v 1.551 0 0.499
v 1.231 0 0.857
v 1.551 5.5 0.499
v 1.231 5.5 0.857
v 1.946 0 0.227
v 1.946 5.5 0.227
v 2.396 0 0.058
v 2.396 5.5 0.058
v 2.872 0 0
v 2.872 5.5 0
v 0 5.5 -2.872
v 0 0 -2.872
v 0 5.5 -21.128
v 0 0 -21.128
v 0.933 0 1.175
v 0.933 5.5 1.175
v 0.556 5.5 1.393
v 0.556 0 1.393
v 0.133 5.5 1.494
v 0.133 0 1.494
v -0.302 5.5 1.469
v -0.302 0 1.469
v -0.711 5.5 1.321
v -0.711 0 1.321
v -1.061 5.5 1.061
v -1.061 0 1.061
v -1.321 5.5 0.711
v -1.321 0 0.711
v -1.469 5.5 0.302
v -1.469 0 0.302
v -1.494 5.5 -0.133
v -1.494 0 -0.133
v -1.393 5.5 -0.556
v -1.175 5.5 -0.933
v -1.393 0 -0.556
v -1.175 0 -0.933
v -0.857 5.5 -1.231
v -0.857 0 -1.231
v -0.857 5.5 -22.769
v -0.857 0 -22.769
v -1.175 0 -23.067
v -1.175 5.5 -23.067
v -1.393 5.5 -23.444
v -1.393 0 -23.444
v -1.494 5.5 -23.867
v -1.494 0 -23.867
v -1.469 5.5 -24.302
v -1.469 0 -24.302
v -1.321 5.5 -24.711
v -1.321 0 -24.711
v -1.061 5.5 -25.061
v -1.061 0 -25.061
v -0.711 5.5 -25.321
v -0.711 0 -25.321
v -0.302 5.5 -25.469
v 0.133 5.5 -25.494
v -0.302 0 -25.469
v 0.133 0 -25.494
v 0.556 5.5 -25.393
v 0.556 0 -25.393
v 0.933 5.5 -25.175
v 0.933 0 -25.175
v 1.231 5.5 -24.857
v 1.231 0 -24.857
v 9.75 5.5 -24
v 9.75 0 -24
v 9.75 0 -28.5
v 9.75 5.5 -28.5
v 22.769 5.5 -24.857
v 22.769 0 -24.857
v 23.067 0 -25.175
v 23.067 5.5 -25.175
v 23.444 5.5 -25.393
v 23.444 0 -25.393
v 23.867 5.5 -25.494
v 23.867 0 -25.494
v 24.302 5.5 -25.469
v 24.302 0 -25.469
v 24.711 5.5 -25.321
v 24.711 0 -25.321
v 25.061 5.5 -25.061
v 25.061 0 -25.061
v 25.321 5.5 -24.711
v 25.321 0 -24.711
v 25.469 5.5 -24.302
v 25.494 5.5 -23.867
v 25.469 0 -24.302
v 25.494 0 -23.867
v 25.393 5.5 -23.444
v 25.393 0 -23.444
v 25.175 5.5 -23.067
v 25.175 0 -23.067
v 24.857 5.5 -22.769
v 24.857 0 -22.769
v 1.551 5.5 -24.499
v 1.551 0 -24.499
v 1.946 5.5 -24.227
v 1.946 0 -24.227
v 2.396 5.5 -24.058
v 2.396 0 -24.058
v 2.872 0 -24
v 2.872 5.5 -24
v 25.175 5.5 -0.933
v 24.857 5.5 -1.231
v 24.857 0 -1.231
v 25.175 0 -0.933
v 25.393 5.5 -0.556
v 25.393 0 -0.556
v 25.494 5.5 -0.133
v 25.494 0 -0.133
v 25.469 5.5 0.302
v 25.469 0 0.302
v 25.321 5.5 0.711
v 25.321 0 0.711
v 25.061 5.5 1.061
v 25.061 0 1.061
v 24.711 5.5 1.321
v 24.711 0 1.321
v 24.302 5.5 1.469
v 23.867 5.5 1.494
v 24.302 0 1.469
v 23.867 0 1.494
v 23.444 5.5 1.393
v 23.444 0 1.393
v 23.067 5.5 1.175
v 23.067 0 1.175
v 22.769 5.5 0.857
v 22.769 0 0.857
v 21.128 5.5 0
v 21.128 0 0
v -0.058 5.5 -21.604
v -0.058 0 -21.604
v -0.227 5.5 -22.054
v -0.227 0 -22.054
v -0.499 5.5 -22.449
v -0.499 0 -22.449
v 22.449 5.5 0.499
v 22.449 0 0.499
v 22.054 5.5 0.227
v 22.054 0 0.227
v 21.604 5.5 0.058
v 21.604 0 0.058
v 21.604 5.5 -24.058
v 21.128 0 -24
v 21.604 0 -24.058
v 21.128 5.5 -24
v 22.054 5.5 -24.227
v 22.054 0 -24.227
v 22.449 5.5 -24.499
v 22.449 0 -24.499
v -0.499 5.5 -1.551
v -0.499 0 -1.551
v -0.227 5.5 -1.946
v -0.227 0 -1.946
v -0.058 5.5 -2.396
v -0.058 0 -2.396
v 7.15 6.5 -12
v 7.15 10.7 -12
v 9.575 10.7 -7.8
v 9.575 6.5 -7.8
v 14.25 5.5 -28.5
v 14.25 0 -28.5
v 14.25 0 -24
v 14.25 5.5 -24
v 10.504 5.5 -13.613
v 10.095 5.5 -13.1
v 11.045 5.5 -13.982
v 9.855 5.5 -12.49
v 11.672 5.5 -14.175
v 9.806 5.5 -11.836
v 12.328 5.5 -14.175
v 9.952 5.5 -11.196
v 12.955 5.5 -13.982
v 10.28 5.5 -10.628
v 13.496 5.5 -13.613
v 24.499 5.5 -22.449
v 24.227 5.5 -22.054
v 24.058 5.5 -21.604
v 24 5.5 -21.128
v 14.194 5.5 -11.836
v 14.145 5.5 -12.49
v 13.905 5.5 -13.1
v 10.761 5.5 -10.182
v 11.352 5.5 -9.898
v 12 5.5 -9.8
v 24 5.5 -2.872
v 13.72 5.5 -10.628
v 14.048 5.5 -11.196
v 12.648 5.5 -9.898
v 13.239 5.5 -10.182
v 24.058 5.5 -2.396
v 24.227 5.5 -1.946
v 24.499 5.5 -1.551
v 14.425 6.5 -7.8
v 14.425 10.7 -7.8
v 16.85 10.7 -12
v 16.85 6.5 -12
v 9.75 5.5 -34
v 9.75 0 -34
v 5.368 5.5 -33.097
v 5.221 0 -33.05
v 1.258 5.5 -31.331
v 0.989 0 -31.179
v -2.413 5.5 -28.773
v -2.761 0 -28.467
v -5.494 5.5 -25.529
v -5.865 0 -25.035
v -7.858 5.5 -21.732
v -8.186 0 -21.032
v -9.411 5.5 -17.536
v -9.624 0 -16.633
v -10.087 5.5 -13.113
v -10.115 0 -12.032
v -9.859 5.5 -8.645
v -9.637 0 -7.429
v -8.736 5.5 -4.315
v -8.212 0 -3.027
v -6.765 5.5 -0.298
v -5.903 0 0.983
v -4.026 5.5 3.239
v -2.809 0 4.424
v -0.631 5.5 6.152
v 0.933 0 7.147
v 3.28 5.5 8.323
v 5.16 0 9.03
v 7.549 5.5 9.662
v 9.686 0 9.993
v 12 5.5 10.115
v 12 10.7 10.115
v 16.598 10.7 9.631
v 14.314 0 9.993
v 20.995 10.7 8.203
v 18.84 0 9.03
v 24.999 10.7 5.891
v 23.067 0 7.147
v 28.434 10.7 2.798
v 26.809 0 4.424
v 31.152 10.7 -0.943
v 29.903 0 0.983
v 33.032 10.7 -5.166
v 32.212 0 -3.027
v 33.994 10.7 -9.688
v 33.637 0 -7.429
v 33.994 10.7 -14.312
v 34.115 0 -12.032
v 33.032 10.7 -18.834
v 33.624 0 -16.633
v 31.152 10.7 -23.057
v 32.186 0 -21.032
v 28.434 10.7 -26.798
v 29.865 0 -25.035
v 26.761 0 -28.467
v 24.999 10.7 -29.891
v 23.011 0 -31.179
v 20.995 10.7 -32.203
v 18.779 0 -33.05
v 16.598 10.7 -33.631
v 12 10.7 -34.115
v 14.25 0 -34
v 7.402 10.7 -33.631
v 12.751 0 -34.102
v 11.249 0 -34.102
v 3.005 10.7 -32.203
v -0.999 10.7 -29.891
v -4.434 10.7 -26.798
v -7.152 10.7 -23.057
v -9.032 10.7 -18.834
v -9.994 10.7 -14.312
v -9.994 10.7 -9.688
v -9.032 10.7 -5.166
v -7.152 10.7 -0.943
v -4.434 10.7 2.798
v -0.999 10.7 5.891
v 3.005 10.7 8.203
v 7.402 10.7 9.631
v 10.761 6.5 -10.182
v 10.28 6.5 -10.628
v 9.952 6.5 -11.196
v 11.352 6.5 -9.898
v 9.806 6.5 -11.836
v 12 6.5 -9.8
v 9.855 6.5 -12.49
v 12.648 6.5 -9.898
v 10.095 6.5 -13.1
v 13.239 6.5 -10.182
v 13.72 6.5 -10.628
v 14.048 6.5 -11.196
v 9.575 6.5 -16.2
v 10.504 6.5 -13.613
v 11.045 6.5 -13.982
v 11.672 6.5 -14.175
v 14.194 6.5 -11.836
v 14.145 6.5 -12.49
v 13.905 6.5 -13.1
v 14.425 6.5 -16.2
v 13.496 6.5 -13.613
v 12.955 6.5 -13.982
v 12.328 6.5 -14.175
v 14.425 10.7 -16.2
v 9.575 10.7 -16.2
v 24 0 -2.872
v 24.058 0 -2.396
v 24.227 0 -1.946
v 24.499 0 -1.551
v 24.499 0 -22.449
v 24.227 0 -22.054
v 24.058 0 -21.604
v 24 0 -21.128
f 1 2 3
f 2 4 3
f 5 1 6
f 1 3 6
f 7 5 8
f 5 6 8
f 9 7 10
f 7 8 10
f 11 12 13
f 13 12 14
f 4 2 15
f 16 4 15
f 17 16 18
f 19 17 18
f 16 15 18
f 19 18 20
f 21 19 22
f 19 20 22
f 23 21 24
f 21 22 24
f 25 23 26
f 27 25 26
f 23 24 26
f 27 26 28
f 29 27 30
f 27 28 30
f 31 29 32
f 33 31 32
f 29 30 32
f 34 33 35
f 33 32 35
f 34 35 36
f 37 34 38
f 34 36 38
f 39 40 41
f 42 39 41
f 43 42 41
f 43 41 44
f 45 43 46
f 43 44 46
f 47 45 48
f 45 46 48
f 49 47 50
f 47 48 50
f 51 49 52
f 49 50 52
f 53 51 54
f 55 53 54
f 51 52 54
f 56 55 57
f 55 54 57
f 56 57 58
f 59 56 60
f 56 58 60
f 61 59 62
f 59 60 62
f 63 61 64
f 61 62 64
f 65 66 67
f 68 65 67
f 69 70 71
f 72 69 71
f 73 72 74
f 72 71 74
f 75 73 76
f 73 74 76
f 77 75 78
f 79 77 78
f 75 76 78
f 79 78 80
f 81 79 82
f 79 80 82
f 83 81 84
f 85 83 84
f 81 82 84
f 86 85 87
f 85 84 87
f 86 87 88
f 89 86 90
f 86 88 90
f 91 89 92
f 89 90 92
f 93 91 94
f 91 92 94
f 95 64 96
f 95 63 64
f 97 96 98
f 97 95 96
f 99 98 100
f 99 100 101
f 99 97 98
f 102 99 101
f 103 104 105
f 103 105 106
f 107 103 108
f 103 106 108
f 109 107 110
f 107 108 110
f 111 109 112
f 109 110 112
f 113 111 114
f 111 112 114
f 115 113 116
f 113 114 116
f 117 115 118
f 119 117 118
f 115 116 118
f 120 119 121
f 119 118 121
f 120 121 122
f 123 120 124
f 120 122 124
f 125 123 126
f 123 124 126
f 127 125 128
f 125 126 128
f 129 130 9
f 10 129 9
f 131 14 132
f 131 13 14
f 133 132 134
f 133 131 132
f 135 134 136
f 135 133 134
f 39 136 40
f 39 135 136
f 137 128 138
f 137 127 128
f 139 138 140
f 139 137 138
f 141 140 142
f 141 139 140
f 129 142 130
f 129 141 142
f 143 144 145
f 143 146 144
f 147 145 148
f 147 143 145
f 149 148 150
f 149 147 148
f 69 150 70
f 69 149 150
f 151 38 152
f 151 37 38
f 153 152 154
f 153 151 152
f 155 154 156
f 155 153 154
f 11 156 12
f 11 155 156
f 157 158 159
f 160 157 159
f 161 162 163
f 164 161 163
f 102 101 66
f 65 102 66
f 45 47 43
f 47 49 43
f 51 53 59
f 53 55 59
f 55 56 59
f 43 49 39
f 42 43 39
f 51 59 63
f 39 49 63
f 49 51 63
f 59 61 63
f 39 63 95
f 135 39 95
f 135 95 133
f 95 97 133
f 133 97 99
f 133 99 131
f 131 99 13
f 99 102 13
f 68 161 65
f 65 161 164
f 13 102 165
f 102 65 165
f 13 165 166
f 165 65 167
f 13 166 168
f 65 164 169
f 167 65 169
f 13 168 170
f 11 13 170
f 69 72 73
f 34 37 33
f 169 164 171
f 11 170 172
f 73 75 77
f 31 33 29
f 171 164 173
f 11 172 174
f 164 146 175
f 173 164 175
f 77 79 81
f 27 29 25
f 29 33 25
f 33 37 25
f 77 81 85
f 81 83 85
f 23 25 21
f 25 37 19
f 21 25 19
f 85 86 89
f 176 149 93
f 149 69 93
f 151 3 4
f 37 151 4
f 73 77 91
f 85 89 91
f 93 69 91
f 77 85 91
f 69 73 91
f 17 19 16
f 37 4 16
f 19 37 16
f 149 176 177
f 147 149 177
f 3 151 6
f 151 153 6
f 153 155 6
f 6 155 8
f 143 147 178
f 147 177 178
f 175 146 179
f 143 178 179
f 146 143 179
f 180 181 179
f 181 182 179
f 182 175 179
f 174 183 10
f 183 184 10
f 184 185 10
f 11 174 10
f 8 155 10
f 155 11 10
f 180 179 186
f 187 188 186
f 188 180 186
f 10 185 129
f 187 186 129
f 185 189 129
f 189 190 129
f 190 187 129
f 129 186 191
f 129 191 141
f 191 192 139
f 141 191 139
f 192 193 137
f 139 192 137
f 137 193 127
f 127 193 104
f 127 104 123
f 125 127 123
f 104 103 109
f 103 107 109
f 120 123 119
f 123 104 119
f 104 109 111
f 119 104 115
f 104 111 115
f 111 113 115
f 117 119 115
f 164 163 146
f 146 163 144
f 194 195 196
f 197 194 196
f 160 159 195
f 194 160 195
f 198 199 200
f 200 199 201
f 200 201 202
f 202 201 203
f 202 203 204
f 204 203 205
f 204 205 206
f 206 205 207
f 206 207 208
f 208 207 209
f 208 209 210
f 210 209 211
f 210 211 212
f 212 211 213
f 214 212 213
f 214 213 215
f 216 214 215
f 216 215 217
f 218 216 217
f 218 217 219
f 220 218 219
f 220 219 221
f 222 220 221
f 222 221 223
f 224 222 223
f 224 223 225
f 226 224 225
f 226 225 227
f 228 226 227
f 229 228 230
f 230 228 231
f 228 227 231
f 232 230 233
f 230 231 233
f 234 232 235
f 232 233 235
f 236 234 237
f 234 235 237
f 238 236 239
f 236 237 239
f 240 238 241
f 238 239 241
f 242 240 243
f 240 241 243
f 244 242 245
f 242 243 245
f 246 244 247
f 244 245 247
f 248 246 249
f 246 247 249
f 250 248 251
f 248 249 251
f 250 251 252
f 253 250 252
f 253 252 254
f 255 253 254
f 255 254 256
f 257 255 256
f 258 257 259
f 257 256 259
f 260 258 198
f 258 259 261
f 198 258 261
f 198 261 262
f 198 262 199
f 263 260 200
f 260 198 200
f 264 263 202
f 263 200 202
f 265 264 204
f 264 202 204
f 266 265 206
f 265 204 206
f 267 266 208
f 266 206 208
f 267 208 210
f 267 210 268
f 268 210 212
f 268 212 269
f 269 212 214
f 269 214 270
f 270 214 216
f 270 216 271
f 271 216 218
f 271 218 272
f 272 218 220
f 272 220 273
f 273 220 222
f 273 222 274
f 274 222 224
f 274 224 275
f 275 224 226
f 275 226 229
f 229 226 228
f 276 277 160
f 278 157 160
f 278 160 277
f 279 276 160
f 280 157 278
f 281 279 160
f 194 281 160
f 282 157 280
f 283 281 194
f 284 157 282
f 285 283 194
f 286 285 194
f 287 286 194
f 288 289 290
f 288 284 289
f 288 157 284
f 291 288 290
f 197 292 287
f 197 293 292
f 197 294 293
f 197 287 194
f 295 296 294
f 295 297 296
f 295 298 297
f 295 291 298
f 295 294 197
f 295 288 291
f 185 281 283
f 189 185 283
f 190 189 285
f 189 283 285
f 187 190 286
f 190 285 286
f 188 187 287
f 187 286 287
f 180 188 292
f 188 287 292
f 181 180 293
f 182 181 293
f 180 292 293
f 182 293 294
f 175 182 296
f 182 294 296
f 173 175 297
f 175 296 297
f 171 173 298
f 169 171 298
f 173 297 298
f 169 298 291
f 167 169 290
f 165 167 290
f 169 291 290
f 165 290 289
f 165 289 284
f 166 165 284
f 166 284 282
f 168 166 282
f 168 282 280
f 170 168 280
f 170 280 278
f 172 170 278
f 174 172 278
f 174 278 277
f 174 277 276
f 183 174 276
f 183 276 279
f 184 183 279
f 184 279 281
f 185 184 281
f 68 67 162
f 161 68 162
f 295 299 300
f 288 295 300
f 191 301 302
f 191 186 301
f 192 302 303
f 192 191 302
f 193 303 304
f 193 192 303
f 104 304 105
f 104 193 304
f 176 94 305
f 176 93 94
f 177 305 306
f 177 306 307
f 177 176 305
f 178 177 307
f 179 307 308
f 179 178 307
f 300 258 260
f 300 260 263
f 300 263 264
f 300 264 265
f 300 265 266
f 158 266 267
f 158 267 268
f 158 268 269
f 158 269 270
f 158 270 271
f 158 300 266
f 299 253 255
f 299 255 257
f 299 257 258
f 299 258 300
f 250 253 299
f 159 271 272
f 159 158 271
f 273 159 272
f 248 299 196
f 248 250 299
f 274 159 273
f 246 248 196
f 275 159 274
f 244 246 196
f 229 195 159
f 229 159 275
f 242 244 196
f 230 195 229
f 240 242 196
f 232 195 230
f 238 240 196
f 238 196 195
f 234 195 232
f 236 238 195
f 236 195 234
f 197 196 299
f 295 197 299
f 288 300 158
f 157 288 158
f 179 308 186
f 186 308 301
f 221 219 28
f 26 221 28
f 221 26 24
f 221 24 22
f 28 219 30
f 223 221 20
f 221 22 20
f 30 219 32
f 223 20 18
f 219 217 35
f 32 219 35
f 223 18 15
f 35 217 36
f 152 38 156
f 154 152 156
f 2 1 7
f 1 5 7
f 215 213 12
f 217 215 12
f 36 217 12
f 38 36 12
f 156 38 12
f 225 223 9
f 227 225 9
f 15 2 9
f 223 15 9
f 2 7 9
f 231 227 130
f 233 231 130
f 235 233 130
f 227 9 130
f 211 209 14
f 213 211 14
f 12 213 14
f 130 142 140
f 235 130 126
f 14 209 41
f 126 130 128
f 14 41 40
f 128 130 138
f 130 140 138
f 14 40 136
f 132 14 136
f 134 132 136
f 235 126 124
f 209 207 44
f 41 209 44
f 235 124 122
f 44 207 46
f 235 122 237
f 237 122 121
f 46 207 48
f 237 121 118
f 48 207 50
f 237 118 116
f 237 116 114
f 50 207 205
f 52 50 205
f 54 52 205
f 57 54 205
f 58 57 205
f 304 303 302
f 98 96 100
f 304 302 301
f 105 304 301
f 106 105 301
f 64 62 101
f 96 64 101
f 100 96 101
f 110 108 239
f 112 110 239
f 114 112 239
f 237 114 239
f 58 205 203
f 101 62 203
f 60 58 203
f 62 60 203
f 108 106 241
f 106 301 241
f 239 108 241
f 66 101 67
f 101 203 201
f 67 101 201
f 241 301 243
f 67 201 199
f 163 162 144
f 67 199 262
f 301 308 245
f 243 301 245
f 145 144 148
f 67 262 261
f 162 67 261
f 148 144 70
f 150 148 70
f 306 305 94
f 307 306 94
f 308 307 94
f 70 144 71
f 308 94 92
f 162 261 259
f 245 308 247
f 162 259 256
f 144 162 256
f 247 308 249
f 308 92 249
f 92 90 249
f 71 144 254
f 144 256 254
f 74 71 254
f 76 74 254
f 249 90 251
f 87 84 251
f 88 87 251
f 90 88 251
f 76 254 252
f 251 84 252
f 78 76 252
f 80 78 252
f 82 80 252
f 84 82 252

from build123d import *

# Parameters (mm, degrees)
BOSS_EXTRUDE1_DEPTH = 5.5
FILLET1_R           = 2
SKETCH2_R           = 22.114757516
BOSS_EXTRUDE2_DEPTH = 5.2
CUT_EXTRUDE1_DEPTH  = 4.2
SKETCH4_R           = 2.2
CUT_EXTRUDE2_DEPTH  = 4.2


with BuildPart() as part:
    # Sketch1 → Boss-Extrude1 (new body)
    with BuildSketch(Plane(origin=(0, 0, 0), x_dir=(1, 0, 0), z_dir=(0, 1, 0))):
        with BuildLine():
            ThreePointArc((1.5, 0), (-1.060660172, -1.060660172), (0, 1.5))
            Line((0, 1.5), (0, 22.5))
            ThreePointArc((0, 22.5), (-1.060660172, 25.060660172), (1.5, 24))
            Line((1.5, 24), (9.75, 24))
            Line((9.75, 24), (9.75, 28.5))
            Line((9.75, 28.5), (9.75, 34))
            ThreePointArc((9.75, 34), (12, -10.114757516), (14.25, 34))
            Line((14.25, 34), (14.25, 28.5))
            Line((14.25, 28.5), (14.25, 24))
            Line((14.25, 24), (22.5, 24))
            ThreePointArc((22.5, 24), (25.060660172, 25.060660172), (24, 22.5))
            Line((24, 22.5), (24, 1.5))
            ThreePointArc((24, 1.5), (25.060660172, -1.060660172), (22.5, 0))
            Line((22.5, 0), (1.5, 0))
        make_face()
        with BuildLine():
            Line((9.75, 34), (9.75, 28.5))
            Line((9.75, 28.5), (14.25, 28.5))
            Line((14.25, 28.5), (14.25, 34))
            ThreePointArc((14.25, 34), (12, 34.114757516), (9.75, 34))
        make_face()
    extrude(amount=BOSS_EXTRUDE1_DEPTH)

    # Fillet1
    fillet1_edges = [part.edges().sort_by_distance(p)[0] for p in [
        (0, 2.75, -22.5),
        (0, 2.75, -1.5),
        (1.5, 2.75, 0),
        (22.5, 2.75, 0),
        (24, 2.75, -1.5),
        (24, 2.75, -22.5),
        (22.5, 2.75, -24),
        (1.5, 2.75, -24),
    ]]
    fillet(fillet1_edges, radius=FILLET1_R)

    # Sketch2 → Boss-Extrude2 (add)
    with BuildSketch(Plane(origin=(0, 5.5, 0), x_dir=(1, 0, 0), z_dir=(0, 1, 0))):
        with Locations(Location((12, 12, 0), (0, 0, 270))):
            Circle(SKETCH2_R)
    extrude(amount=BOSS_EXTRUDE2_DEPTH)

    # Sketch3 → Cut-Extrude1 (cut)
    with BuildSketch(Plane(origin=(0, 10.7, 0), x_dir=(1, 0, 0), z_dir=(0, 1, 0))):
        Polygon((16.849742261, 12), (14.424871131, 16.2), (9.575128869, 16.2), (7.150257739, 12), (9.575128869, 7.8), (14.424871131, 7.8), align=None)
    extrude(amount=-CUT_EXTRUDE1_DEPTH, mode=Mode.SUBTRACT)

    # Sketch4 → Cut-Extrude2 (cut)
    with BuildSketch(Plane(origin=(0, 6.5, 0), x_dir=(1, 0, 0), z_dir=(0, 1, 0))):
        with Locations(Location((12, 12, 0), (0, 0, 270))):
            Circle(SKETCH4_R)
    extrude(amount=-CUT_EXTRUDE2_DEPTH, mode=Mode.SUBTRACT)


solid = part.part
